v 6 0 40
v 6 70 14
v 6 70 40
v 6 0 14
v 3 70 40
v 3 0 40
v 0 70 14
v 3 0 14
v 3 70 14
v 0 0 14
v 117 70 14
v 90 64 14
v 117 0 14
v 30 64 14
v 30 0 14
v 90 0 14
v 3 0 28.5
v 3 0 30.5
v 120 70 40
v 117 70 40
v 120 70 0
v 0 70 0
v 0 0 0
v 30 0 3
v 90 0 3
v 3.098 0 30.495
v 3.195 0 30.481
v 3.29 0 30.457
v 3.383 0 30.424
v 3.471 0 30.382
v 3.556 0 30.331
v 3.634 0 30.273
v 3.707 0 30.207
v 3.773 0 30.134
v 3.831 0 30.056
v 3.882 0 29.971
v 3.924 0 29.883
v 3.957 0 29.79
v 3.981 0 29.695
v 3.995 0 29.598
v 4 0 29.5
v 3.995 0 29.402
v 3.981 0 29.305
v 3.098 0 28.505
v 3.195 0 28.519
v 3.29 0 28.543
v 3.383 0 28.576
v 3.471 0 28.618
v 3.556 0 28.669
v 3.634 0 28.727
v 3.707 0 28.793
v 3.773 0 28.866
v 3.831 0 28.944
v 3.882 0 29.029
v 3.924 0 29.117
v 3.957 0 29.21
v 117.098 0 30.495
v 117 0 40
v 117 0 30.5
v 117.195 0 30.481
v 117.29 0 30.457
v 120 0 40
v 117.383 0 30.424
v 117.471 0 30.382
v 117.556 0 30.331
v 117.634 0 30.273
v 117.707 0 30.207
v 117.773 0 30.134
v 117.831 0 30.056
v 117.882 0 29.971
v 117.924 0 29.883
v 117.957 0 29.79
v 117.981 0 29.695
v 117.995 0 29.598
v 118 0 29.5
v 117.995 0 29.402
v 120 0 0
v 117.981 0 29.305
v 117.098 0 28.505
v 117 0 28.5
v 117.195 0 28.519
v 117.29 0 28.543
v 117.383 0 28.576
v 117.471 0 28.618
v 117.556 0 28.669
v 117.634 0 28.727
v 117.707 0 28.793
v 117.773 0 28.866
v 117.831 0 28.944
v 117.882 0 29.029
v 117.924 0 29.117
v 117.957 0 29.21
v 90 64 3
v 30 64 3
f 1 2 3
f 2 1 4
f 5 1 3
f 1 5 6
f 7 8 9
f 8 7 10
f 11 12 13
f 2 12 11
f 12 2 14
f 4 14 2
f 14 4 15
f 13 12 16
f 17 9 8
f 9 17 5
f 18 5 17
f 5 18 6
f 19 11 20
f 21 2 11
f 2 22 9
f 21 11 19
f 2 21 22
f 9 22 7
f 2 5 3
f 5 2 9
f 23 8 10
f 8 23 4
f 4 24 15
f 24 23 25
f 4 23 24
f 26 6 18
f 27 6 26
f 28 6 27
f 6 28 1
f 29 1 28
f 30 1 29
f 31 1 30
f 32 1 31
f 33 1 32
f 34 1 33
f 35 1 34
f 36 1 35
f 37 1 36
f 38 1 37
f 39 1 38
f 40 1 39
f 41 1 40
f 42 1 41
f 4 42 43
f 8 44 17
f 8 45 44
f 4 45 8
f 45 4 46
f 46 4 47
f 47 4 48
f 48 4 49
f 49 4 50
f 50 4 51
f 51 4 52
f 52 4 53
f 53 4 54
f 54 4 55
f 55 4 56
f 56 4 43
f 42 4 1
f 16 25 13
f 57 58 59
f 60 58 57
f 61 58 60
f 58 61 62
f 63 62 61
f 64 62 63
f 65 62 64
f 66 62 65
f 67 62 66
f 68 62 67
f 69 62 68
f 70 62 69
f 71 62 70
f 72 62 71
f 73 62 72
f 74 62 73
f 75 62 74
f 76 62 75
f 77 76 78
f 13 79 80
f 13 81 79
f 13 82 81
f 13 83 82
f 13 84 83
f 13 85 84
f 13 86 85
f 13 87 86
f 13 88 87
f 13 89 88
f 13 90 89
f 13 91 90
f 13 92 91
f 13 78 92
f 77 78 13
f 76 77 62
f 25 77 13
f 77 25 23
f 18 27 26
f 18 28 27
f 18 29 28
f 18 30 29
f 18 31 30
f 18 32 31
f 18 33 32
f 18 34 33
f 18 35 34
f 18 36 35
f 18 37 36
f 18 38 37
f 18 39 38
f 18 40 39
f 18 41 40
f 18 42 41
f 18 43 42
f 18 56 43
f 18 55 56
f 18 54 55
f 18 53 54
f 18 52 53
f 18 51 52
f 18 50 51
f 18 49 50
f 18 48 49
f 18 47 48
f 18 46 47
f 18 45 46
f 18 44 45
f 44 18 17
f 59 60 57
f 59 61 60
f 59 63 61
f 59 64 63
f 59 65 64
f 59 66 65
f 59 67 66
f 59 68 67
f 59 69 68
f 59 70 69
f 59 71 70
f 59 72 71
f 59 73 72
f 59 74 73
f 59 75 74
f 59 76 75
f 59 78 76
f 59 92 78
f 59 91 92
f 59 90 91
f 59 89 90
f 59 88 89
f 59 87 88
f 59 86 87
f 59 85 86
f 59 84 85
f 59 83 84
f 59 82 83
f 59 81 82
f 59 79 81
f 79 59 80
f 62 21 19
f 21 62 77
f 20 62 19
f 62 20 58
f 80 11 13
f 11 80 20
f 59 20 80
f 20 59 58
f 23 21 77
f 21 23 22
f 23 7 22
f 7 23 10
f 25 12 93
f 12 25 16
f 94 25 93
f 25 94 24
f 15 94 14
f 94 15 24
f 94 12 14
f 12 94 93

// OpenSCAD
// Mini horizontal gel-electrophoresis box - buffer tank
// Print orientation: base on XY plane, open top facing +Z

// ---- Tank dimensions ----
outer_x = 120;   // outer length in X
outer_y = 70;    // outer width in Y
height  = 40;    // overall height in Z
wall    = 3;     // wall thickness
floor   = 3;     // floor thickness (bottom solid)

// ---- Platform dimensions ----
plat_len   = 60;  // platform length in X (centred)
plat_wid   = outer_y - 2*wall; // platform spans full inner width
plat_top_z = 13;  // top of platform (inner floor at z=10, 10 mm below)

// ---- Electrode holes ----
hole_d     = 2;   // hole diameter
hole_y     = 0;   // hole Y position
hole_z     = 30;  // hole Z position
eps        = 0.5; // cutter overshoot past end walls

// ---- Modelling helpers ----
inner_h = height - wall;              // height above floor
overwall = wall + floor;              // floor height above which walls continue

difference() {
    union() {
        // Main tank body: floor + walls up to the platform top
        cube([outer_x, outer_y, plat_top_z + 1]);

        // Side walls above the platform (both chambers, full height)
        for (sx = [-1, 1])
            translate([sx > 0 ? outer_x - wall : wall, 0, plat_top_z + 1])
                cube([wall, outer_y, height - (plat_top_z + 1)]);
    }

    // Platform: solid block dividing the bottom into two chambers
    translate([outer_x/2 - plat_len/2, 0, floor])
        cube([plat_len, plat_wid, plat_top_z - floor + 1]);

    // Electrode holes through each end wall along X
    for (sx = [-1, 1])
        translate([sx > 0 ? outer_x - wall : wall, hole_y, hole_z - eps])
            rotate([90, 0, 0])
                cylinder(d = hole_d, h = wall + 2*eps, $fn = 64);
}
